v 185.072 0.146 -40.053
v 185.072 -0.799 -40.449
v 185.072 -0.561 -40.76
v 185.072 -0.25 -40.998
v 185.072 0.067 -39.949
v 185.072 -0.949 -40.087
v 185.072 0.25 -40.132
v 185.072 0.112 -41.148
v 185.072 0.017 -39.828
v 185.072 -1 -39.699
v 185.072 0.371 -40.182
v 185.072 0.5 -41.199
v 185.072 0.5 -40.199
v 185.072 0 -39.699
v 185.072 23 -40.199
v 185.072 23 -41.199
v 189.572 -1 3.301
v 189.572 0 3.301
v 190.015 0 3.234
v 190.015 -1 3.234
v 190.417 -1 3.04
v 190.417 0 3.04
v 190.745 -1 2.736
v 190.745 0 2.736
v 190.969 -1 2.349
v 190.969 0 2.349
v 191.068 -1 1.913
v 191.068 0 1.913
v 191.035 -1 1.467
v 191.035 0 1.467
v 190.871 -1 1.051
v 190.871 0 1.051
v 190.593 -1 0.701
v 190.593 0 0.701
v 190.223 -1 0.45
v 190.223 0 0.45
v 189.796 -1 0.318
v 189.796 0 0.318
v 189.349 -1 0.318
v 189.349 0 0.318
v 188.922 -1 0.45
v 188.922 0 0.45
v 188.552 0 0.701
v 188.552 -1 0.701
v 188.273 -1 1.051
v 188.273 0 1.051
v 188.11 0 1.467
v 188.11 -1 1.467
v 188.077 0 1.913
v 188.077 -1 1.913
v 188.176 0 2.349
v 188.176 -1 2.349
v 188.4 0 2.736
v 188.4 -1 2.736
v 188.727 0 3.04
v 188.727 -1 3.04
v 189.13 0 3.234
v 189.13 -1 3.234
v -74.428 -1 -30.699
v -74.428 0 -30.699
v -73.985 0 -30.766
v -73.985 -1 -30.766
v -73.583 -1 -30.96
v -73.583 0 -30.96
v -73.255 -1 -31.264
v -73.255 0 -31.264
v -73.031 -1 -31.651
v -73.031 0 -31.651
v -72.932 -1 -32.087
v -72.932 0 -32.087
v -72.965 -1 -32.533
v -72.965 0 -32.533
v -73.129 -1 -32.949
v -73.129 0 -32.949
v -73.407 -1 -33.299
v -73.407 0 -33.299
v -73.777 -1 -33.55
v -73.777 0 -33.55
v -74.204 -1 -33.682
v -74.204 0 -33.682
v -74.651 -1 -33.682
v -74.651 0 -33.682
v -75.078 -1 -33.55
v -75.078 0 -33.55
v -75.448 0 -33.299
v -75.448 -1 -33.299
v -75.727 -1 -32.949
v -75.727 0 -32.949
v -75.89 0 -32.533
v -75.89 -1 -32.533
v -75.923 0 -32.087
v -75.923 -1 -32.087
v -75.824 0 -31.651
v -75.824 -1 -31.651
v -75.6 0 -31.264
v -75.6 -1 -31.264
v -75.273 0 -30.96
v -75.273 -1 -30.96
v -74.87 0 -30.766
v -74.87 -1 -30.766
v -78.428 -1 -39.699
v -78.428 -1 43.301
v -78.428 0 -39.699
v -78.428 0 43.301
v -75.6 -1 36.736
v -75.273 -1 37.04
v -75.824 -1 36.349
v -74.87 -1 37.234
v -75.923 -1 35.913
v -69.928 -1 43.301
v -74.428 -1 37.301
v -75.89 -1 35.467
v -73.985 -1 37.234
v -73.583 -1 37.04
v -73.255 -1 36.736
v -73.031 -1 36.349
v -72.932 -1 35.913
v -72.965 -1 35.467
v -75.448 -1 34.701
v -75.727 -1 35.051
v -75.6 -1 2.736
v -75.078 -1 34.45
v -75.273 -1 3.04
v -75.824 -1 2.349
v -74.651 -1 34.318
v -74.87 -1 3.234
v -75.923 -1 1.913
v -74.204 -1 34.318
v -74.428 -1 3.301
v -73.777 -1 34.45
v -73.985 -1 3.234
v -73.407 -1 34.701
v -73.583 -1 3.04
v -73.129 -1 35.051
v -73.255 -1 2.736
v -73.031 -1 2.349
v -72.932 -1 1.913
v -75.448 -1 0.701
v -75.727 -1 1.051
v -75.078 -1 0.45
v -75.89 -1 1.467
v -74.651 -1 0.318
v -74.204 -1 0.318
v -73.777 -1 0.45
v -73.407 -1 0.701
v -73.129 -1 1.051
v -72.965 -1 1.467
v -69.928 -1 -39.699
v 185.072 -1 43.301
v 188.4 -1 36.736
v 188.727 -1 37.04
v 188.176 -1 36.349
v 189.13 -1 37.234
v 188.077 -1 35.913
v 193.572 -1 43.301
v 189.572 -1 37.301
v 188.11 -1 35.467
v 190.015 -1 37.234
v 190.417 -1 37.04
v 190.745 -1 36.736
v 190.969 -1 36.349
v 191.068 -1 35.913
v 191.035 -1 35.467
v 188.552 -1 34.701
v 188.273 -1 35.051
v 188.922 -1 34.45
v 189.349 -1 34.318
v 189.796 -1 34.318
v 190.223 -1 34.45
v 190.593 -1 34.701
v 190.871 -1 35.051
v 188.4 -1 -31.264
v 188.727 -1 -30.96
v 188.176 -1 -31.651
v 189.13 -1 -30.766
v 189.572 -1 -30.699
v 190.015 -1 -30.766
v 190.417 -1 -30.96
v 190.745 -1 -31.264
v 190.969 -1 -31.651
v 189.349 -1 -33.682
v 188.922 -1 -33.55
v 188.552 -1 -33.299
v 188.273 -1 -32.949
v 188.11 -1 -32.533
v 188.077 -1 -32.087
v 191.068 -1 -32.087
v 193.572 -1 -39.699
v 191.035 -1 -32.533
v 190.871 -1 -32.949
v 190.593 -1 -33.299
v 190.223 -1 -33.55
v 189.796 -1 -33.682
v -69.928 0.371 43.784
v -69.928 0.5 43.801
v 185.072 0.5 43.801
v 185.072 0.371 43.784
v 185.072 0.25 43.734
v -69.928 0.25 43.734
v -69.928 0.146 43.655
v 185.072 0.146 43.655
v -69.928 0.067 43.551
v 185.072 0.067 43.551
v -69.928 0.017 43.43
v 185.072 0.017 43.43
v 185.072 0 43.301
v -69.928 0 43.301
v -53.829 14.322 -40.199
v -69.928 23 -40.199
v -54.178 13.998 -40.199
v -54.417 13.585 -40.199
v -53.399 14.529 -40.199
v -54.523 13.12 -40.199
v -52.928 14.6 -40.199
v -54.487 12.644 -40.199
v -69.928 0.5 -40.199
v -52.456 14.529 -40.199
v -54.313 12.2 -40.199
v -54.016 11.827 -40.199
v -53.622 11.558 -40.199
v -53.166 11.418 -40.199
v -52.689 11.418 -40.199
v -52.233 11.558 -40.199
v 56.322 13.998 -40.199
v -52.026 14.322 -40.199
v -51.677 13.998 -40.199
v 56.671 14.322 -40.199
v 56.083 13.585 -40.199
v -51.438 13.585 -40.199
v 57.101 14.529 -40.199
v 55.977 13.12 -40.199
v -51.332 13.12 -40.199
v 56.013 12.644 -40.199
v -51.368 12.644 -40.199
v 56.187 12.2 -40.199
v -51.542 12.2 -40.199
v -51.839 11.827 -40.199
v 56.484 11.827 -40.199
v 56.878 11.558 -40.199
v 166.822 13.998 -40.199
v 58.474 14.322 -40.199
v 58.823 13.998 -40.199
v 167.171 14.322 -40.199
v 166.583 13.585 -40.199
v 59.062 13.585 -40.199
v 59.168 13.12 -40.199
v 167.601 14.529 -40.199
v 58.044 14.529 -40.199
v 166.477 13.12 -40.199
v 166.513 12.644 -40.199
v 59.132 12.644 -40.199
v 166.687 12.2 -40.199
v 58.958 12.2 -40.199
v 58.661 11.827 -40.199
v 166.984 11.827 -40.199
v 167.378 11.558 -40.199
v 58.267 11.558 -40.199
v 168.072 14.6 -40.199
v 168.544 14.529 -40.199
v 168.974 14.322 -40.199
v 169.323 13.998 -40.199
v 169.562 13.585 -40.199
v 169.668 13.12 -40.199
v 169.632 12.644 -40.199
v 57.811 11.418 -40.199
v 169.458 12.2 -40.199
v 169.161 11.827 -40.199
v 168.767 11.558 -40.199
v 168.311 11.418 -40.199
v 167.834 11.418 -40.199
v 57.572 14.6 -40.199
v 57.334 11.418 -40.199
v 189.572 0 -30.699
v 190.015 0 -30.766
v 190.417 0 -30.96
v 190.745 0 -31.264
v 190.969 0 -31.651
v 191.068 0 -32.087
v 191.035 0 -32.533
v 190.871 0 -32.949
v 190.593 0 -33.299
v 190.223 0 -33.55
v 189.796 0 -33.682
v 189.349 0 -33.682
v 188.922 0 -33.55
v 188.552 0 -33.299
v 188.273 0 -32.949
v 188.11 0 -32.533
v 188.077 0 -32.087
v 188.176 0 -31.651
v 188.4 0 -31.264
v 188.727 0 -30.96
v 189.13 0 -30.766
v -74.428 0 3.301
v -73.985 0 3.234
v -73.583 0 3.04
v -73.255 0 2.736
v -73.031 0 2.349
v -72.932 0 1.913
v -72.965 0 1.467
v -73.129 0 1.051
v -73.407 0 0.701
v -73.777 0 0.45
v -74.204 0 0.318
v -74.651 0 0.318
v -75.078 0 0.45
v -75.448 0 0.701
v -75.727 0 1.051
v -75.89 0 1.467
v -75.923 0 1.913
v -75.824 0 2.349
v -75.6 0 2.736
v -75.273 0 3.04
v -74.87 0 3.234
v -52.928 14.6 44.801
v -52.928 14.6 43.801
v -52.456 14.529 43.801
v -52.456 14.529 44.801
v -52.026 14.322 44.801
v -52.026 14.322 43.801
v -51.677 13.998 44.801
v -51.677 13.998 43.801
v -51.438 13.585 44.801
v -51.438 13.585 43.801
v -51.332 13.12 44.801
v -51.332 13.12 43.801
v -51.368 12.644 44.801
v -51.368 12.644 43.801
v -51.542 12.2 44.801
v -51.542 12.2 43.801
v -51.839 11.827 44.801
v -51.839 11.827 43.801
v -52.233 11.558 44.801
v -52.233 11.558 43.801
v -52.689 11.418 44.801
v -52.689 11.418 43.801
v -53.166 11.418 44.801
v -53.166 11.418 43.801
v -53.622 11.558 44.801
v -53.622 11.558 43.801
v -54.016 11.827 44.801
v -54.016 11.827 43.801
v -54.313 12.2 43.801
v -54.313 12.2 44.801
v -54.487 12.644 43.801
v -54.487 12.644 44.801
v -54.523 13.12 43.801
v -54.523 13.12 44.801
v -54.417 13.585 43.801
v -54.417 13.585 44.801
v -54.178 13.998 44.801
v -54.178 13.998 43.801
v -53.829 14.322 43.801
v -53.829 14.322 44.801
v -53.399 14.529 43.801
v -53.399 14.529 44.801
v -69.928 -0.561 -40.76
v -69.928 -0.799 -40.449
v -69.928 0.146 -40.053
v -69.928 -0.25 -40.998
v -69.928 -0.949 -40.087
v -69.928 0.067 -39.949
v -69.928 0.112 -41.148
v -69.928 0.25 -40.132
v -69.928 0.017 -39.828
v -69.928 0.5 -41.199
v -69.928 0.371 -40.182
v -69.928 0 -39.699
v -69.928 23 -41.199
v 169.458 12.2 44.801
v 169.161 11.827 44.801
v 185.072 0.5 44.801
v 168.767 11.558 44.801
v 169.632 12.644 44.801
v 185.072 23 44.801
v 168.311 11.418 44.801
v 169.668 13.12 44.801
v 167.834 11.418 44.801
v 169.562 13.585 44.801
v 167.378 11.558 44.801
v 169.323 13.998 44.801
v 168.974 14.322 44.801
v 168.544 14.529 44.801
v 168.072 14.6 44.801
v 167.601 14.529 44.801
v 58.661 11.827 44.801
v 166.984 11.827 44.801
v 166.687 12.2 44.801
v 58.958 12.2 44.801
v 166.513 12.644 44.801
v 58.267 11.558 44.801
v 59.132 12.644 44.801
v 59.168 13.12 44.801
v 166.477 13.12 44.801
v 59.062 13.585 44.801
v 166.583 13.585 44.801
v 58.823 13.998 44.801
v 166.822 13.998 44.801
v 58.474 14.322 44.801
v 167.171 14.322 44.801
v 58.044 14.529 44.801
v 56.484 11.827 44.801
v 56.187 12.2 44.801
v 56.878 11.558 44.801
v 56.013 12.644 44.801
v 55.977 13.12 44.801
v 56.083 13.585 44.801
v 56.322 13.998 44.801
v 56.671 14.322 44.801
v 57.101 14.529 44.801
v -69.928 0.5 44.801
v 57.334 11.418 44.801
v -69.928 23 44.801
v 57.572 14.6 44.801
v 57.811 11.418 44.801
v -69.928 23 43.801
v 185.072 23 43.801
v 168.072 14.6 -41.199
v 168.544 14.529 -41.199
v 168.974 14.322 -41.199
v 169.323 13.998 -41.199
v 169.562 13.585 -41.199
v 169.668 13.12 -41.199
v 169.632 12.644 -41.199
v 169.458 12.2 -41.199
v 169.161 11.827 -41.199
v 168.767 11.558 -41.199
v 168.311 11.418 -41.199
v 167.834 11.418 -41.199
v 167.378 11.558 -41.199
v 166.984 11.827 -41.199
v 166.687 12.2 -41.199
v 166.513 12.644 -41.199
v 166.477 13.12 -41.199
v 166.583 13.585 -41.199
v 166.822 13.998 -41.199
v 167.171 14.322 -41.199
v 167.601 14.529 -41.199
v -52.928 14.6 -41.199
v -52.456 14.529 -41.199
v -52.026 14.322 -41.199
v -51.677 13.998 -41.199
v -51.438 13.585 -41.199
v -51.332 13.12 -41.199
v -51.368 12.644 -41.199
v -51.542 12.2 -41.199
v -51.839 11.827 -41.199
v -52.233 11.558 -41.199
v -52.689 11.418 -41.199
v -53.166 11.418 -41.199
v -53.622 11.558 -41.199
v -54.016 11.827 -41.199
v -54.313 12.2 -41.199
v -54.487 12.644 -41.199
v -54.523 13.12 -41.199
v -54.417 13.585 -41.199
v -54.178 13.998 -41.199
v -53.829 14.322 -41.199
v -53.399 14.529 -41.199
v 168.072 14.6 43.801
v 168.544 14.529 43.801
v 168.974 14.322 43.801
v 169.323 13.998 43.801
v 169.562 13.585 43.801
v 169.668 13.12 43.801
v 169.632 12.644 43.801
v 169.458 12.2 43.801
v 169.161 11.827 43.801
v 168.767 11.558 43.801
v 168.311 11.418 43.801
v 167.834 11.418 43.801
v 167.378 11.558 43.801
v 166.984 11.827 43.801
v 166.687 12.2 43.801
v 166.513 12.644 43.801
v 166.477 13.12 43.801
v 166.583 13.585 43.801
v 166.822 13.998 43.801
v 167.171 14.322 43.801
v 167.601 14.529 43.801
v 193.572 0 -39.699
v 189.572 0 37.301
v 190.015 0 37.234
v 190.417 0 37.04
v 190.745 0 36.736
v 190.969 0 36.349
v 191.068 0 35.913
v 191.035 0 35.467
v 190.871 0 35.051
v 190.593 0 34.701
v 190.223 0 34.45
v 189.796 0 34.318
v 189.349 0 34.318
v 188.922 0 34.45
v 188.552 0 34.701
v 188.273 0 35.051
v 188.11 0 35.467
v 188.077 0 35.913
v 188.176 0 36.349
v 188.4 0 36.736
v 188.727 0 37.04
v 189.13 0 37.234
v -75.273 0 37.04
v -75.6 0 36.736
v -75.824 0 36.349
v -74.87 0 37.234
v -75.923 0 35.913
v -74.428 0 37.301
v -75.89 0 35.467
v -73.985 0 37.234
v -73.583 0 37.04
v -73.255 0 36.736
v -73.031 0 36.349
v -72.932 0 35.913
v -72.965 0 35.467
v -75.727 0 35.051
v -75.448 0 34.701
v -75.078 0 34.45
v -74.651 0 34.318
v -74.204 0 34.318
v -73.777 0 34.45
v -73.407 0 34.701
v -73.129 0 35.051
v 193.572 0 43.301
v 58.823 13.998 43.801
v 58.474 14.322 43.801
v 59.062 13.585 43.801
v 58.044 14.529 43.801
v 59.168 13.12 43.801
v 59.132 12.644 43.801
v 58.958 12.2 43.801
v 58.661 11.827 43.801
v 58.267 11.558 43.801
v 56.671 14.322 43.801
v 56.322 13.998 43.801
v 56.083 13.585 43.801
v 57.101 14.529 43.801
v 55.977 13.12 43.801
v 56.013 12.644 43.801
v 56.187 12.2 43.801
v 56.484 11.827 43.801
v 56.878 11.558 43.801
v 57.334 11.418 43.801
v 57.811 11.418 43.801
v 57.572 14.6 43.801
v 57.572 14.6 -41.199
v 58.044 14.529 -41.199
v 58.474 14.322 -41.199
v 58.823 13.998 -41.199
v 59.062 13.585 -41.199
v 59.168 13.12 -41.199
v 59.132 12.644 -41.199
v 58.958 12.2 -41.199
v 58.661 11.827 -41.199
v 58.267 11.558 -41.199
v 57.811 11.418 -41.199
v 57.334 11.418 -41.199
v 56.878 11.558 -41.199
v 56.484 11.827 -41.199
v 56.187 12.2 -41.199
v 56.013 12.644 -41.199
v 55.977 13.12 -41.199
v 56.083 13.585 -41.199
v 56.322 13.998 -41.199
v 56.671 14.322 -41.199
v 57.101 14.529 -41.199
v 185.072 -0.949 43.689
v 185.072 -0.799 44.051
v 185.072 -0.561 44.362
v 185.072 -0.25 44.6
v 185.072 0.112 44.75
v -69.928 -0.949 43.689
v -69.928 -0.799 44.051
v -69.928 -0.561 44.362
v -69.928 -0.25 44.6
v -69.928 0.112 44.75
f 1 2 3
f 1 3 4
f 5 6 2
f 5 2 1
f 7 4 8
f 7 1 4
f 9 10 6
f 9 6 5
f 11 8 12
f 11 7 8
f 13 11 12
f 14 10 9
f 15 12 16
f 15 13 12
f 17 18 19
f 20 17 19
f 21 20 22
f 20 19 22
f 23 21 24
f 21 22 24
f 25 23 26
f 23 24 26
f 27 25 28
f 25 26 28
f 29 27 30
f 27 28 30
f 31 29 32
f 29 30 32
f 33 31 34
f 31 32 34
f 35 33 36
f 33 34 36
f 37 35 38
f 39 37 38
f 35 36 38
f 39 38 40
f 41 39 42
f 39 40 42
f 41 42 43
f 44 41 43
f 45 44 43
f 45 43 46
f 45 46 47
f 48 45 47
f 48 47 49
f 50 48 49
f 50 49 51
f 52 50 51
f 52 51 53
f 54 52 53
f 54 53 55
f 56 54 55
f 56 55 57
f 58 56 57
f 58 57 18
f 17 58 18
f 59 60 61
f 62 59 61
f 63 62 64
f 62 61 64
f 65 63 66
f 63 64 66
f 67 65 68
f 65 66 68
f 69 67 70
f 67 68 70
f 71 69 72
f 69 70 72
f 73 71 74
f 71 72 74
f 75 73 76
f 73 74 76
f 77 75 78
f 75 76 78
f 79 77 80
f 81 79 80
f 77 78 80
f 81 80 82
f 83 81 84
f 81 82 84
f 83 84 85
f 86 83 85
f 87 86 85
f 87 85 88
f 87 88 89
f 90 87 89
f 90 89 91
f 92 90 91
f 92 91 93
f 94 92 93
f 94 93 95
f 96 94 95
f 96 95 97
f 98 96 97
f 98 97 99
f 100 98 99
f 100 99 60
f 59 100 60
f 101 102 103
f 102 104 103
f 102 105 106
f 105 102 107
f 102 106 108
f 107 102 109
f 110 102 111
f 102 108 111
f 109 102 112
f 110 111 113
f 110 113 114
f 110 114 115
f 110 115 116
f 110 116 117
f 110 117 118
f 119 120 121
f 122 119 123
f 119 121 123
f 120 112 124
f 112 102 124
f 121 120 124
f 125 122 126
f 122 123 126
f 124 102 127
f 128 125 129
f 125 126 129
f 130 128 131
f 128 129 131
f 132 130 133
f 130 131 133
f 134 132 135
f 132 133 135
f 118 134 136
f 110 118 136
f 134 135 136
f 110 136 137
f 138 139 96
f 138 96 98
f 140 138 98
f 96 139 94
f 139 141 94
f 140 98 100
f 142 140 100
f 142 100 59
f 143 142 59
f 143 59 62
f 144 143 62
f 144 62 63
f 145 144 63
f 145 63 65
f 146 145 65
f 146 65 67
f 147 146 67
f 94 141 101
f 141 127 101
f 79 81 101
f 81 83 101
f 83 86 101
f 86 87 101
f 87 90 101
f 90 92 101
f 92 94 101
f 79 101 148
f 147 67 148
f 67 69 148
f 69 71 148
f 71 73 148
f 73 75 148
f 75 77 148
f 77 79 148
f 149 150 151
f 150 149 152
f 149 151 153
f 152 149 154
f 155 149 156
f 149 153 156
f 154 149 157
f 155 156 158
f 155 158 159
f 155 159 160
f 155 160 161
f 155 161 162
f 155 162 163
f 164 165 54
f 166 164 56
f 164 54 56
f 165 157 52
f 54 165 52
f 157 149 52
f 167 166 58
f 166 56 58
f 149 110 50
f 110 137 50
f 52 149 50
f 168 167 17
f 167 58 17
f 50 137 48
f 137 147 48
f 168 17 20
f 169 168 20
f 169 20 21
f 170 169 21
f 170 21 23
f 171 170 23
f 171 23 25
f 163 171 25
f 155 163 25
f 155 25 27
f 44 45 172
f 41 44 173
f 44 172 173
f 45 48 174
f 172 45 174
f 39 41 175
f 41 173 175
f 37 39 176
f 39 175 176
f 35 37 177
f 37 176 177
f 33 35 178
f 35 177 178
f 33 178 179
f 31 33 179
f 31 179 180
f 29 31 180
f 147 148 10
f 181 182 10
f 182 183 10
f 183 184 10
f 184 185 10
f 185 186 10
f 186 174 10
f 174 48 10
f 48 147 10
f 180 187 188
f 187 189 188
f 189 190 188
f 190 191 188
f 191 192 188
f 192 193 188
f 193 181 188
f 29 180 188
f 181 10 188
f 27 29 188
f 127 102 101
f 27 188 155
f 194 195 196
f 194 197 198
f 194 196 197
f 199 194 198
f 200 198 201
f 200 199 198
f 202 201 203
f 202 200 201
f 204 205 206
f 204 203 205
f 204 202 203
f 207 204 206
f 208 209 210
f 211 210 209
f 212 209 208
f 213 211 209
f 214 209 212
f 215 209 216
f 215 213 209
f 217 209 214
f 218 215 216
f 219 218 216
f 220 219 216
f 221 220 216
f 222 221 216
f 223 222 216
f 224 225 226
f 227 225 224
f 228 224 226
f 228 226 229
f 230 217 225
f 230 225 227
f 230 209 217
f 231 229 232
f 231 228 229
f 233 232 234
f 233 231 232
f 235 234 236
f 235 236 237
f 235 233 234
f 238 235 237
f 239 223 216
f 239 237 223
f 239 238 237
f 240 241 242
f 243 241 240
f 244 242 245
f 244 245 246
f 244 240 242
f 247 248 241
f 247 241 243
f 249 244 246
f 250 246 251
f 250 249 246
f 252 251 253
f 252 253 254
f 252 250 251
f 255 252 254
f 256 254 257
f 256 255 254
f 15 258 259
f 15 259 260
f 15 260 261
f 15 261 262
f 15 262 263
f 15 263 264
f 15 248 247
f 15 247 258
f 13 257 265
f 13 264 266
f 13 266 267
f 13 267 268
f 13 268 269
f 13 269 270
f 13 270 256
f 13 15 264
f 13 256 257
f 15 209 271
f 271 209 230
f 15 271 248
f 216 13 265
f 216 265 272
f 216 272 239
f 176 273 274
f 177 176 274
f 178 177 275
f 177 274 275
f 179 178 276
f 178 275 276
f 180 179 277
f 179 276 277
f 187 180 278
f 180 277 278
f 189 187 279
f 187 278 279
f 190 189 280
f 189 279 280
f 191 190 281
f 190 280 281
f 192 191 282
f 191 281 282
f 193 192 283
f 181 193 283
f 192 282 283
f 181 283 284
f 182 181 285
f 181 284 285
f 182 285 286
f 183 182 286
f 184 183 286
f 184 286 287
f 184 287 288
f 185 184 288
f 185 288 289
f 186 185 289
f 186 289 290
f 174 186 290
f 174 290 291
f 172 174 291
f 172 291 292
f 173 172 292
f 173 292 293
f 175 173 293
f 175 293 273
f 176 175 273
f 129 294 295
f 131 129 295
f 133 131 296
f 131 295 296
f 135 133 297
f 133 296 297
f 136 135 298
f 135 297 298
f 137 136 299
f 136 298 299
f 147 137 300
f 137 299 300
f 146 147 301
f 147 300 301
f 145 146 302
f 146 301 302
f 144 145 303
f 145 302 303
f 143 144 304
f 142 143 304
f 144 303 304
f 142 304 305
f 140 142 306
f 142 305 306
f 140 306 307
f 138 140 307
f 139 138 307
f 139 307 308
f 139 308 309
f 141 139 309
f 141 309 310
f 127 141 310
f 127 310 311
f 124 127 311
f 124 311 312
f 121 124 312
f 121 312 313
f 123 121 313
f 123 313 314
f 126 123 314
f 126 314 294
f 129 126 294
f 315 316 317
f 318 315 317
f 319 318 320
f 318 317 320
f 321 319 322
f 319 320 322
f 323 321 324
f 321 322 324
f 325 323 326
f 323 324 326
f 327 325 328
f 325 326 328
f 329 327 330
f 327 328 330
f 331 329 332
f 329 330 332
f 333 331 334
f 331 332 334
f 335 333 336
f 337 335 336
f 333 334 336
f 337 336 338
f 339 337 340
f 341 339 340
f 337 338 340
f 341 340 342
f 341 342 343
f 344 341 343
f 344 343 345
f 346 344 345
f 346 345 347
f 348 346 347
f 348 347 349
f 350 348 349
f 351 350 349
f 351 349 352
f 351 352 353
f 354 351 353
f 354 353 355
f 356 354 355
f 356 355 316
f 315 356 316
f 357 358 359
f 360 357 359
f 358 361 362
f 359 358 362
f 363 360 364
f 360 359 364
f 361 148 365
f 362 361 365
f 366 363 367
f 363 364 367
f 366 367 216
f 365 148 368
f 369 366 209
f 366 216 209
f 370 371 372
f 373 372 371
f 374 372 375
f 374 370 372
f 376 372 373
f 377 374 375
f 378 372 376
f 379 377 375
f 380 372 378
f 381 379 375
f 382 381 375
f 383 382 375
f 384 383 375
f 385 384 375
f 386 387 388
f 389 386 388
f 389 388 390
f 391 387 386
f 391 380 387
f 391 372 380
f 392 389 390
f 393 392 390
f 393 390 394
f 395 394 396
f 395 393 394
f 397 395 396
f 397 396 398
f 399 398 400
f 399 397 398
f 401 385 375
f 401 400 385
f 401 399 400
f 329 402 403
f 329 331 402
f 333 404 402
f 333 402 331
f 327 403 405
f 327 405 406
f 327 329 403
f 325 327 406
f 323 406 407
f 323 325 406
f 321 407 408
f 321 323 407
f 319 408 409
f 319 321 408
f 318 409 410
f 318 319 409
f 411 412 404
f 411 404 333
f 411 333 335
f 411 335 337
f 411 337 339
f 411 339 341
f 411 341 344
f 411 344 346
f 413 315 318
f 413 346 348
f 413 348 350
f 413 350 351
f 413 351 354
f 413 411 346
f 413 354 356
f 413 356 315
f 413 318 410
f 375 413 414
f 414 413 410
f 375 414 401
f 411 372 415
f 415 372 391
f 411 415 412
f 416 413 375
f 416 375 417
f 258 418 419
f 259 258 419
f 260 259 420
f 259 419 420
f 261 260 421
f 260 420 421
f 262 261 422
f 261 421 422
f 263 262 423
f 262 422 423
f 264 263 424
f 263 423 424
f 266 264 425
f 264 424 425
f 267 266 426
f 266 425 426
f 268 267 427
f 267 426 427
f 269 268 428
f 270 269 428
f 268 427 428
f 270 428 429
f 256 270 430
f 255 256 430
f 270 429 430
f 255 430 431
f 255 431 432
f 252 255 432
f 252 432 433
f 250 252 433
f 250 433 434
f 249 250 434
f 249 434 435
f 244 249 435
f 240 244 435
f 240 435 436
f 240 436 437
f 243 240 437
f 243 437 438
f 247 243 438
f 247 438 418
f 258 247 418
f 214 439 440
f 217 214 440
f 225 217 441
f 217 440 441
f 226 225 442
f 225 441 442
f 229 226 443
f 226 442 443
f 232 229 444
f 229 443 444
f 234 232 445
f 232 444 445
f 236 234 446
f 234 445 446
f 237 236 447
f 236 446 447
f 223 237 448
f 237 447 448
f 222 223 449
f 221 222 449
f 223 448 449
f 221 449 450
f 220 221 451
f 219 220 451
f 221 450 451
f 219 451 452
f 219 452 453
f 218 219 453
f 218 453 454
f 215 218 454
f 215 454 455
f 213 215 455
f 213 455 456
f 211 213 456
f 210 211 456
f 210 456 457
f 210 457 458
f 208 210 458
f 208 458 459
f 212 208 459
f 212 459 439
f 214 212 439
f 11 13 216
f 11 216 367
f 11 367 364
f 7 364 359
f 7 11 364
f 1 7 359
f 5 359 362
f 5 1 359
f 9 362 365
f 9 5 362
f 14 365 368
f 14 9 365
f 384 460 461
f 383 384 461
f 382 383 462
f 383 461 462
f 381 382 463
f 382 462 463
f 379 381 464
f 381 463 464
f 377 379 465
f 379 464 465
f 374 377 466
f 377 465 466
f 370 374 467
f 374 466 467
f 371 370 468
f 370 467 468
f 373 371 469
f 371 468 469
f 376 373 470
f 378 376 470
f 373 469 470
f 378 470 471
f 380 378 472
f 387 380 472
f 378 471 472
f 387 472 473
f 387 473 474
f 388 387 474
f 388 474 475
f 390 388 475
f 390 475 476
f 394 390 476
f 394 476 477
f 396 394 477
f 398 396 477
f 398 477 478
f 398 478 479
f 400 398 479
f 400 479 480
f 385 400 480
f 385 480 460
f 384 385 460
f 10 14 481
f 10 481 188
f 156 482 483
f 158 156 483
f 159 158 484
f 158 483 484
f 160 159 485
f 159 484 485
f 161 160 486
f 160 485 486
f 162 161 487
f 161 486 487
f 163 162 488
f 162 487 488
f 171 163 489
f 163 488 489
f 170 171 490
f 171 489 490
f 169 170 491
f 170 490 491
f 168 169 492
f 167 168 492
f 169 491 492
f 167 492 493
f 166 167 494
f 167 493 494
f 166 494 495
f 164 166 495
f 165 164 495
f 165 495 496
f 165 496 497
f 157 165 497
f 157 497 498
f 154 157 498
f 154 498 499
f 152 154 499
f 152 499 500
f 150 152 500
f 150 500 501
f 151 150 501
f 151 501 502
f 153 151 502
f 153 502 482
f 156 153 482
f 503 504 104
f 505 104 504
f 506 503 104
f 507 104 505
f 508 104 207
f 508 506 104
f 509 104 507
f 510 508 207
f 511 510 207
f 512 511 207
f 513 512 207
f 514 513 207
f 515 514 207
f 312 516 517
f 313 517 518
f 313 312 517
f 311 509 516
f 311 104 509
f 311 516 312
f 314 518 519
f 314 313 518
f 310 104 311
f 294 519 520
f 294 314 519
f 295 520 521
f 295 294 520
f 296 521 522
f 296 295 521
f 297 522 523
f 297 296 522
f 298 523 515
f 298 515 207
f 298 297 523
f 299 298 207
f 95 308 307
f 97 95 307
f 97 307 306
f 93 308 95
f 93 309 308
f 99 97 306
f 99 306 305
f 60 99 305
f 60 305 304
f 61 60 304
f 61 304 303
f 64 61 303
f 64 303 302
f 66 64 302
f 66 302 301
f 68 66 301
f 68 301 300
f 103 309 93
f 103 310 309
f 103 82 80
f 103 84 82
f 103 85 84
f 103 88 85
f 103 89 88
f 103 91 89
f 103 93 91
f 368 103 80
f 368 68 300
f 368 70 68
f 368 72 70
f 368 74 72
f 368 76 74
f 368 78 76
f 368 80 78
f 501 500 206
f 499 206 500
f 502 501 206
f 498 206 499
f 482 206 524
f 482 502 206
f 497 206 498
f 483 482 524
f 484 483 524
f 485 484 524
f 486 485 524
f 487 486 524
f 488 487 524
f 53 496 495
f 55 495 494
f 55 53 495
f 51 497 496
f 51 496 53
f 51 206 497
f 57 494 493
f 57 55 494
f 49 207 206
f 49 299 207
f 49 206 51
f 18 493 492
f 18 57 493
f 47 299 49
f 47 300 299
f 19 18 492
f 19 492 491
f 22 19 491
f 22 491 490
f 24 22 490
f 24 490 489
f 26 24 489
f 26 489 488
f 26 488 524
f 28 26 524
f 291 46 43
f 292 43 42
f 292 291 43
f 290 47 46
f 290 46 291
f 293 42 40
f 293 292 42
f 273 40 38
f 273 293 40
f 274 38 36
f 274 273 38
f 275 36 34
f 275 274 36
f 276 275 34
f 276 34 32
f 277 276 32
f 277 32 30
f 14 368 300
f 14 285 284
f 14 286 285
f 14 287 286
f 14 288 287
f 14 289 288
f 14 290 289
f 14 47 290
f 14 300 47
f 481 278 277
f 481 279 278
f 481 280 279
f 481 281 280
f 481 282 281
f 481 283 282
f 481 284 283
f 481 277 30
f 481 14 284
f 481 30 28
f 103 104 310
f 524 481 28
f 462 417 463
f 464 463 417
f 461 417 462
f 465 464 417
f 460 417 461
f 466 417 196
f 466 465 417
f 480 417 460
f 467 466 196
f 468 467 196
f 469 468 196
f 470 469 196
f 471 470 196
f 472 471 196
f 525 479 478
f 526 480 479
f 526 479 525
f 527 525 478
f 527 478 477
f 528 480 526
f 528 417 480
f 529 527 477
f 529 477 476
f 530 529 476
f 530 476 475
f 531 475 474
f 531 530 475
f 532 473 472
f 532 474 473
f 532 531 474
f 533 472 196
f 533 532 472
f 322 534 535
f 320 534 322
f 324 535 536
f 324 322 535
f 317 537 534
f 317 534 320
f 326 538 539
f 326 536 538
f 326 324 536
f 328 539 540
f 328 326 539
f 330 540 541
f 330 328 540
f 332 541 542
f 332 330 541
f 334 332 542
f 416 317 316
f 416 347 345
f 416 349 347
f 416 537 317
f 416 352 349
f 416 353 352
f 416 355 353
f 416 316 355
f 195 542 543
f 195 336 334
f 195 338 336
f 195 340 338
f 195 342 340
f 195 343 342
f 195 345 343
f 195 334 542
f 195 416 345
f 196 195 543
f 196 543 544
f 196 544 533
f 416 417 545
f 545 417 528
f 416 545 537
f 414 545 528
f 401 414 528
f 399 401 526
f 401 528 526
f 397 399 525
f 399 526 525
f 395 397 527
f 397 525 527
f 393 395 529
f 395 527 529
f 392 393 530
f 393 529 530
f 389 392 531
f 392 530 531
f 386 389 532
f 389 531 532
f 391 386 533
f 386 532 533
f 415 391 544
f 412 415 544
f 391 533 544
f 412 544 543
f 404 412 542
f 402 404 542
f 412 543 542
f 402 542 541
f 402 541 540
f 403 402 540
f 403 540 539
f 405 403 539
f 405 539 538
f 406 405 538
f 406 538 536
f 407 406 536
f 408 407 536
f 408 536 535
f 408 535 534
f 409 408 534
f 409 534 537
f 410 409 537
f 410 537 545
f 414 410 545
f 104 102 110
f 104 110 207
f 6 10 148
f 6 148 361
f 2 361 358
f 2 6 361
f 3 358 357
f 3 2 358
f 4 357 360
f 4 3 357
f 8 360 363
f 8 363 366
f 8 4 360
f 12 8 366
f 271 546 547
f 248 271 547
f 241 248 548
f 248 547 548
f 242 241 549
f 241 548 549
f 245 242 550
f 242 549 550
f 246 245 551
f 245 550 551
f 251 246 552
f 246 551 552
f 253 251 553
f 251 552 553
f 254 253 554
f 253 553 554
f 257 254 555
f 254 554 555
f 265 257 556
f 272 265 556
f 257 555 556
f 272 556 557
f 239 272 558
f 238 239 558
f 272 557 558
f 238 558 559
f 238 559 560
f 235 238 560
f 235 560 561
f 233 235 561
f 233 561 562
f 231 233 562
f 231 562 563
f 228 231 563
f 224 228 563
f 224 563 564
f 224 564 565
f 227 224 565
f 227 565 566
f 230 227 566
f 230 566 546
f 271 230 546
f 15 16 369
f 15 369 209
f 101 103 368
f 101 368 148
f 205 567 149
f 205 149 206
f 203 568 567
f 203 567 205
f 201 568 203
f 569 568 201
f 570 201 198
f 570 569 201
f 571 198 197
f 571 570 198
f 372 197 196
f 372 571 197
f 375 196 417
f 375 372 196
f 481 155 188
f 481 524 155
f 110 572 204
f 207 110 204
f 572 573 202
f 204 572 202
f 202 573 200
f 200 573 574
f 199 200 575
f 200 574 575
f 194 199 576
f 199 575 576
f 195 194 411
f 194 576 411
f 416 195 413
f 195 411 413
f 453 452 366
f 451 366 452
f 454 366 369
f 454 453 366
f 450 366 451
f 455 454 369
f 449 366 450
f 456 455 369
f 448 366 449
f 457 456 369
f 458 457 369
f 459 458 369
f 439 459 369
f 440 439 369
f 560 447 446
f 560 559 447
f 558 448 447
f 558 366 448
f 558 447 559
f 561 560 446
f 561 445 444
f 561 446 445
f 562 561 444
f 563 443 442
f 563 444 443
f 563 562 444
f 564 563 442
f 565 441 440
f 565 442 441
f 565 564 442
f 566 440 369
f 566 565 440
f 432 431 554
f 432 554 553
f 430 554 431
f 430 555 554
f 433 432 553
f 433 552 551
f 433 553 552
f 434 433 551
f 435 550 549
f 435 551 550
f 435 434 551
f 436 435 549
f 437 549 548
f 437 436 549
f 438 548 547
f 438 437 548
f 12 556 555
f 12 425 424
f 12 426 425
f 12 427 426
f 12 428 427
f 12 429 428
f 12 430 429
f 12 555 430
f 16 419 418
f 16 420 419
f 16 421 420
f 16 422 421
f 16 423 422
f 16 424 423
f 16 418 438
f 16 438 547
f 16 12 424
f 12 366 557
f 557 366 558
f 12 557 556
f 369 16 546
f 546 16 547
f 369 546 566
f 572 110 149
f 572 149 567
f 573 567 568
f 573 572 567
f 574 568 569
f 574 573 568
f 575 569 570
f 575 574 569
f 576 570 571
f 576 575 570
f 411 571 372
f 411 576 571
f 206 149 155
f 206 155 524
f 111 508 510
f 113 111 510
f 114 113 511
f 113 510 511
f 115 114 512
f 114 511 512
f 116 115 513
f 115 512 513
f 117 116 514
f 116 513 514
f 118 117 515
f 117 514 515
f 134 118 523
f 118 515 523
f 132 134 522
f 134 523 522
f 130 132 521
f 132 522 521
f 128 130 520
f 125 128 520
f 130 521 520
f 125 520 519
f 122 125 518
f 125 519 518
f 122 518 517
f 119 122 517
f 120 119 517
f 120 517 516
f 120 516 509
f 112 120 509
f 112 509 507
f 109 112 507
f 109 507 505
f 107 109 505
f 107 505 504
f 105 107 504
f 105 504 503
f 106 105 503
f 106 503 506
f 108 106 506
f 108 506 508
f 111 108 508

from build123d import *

# Parameters (mm, degrees)
SKETCH1_W                      = 272
SKETCH1_H                      = 84
BASE_FLANGE1_DEPTH             = 1
EDGE_FLANGE1_STRIP_W           = 5
EDGE_FLANGE1_STRIP_H           = 1
EDGE_FLANGE1_STRIP_CUT_DEPTH   = 272
EDGE_FLANGE1_STRIP_2_W         = 5
EDGE_FLANGE1_STRIP_2_H         = 1
EDGE_FLANGE1_STRIP_CUT_2_DEPTH = 272
EDGE_FLANGE1_DEPTH             = 272
EDGE_FLANGE1_BEND_DEPTH        = 272
CUT_EXTRUDE1_START             = -78.427547771
CUT_EXTRUDE1_DEPTH             = 8.5
CUT_EXTRUDE1_START_2           = 185.072452229
CUT_EXTRUDE1_2_DEPTH           = 8.5
SKETCH13_R                     = 1.6
CUT_EXTRUDE2_DEPTH             = 100
SKETCH14_R                     = 1.5
CUT_EXTRUDE3_DEPTH             = 100


# Read off the part's stored shape, not the designer's step: Cut-Extrude1
# Sheet-metal steps are written as plain solids
with BuildPart() as part:
    # Sketch1 → Base-Flange1 (new body)
    with BuildSketch(Plane(origin=(0, 0, 0), x_dir=(1, 0, 0), z_dir=(0, 1, 0))):
        with Locations((57.572452229, -1.800955414)):
            Rectangle(SKETCH1_W, SKETCH1_H)
    extrude(amount=-BASE_FLANGE1_DEPTH)

    # Edge-Flange1 strip (across the edge) → Edge-Flange1 strip cut (cut)
    with BuildSketch(Plane(origin=(-78.427547771, 0, 43.800955414), x_dir=(0, 0, -1), z_dir=(1, 0, 0))):
        with Locations((-2, -0.5)):
            Rectangle(EDGE_FLANGE1_STRIP_W, EDGE_FLANGE1_STRIP_H)
    extrude(amount=EDGE_FLANGE1_STRIP_CUT_DEPTH, mode=Mode.SUBTRACT)

    # Edge-Flange1 strip 2 (across the edge) → Edge-Flange1 strip cut 2 (cut)
    with BuildSketch(Plane(origin=(193.572452229, 0, -40.199044586), x_dir=(0, 0, 1), z_dir=(-1, 0, 0))):
        with Locations((-2, -0.5)):
            Rectangle(EDGE_FLANGE1_STRIP_2_W, EDGE_FLANGE1_STRIP_2_H)
    extrude(amount=EDGE_FLANGE1_STRIP_CUT_2_DEPTH, mode=Mode.SUBTRACT)

    # Edge-Flange1 section (across the edge) → Edge-Flange1 (add)
    with BuildSketch(Plane(origin=(-78.427547771, 0, 43.800955414), x_dir=(0, 0, -1), z_dir=(1, 0, 0))):
        with BuildLine():
            Line((-1, 0.5), (-1, 23))
            Line((-1, 23), (0, 23))
            Line((0, 23), (0, 0.5))
            ThreePointArc((0, 0.5), (0.146446609, 0.146446609), (0.5, 0))
            Line((0.5, 0), (0.5, -1))
            ThreePointArc((0.5, -1), (-0.560660172, -0.560660172), (-1, 0.5))
        make_face()
    extrude(amount=EDGE_FLANGE1_DEPTH)

    # Edge-Flange1 section 2 (across the edge) → Edge-Flange1 bend (add)
    with BuildSketch(Plane(origin=(193.572452229, 0, -40.199044586), x_dir=(0, 0, 1), z_dir=(-1, 0, 0))):
        with BuildLine():
            Line((-1, 0.5), (-1, 23))
            Line((-1, 23), (0, 23))
            Line((0, 23), (0, 0.5))
            ThreePointArc((0, 0.5), (0.146446609, 0.146446609), (0.5, 0))
            Line((0.5, 0), (0.5, -1))
            ThreePointArc((0.5, -1), (-0.560660172, -0.560660172), (-1, 0.5))
        make_face()
    extrude(amount=EDGE_FLANGE1_BEND_DEPTH)

    # Cut-Extrude1 outline → Cut-Extrude1 (cut)
    with BuildSketch(Plane.YZ.offset(CUT_EXTRUDE1_START)):
        with BuildLine():
            ThreePointArc((0.5, -40.199044586), (0.146446609, -40.052597977), (0, -39.699044586))
            Line((0, -39.699044586), (-1, -39.699044586))
            ThreePointArc((-1, -39.699044586), (-0.560660172, -40.759704758), (0.5, -41.199044586))
            Line((0.5, -41.199044586), (23, -41.199044586))
            Line((23, -41.199044586), (23, -40.199044586))
            Line((23, -40.199044586), (0.5, -40.199044586))
        make_face()
        with BuildLine():
            ThreePointArc((0.5, 44.800955414), (-0.560660172, 44.361615586), (-1, 43.300955414))
            Line((-1, 43.300955414), (0, 43.300955414))
            ThreePointArc((0, 43.300955414), (0.146446609, 43.654508805), (0.5, 43.800955414))
            Line((0.5, 43.800955414), (23, 43.800955414))
            Line((23, 43.800955414), (23, 44.800955414))
            Line((23, 44.800955414), (0.5, 44.800955414))
        make_face()
    extrude(amount=CUT_EXTRUDE1_DEPTH, mode=Mode.SUBTRACT)

    # Cut-Extrude1 2 outline → Cut-Extrude1 2 (cut)
    with BuildSketch(Plane.YZ.offset(CUT_EXTRUDE1_START_2)):
        with BuildLine():
            ThreePointArc((0.5, -40.199044586), (0.146446609, -40.052597977), (0, -39.699044586))
            Line((0, -39.699044586), (-1, -39.699044586))
            ThreePointArc((-1, -39.699044586), (-0.560660172, -40.759704758), (0.5, -41.199044586))
            Line((0.5, -41.199044586), (23, -41.199044586))
            Line((23, -41.199044586), (23, -40.199044586))
            Line((23, -40.199044586), (0.5, -40.199044586))
        make_face()
        with BuildLine():
            ThreePointArc((0.5, 44.800955414), (-0.560660172, 44.361615586), (-1, 43.300955414))
            Line((-1, 43.300955414), (0, 43.300955414))
            ThreePointArc((0, 43.300955414), (0.146446609, 43.654508805), (0.5, 43.800955414))
            Line((0.5, 43.800955414), (23, 43.800955414))
            Line((23, 43.800955414), (23, 44.800955414))
            Line((23, 44.800955414), (0.5, 44.800955414))
        make_face()
    extrude(amount=CUT_EXTRUDE1_2_DEPTH, mode=Mode.SUBTRACT)

    # Sketch13 → Cut-Extrude2 (cut)
    with BuildSketch(Plane(origin=(0, 0, -41.199044586), x_dir=(-1, 0, 0), z_dir=(0, 0, -1))):
        with Locations(Location((-168.072452229, 13, 0), (0, 0, 90))):
            Circle(SKETCH13_R)
        with Locations(Location((-57.572452229, 13, 0), (0, 0, 90))):
            Circle(SKETCH13_R)
        with Locations(Location((52.927547771, 13, 0), (0, 0, 90))):
            Circle(SKETCH13_R)
    extrude(amount=-CUT_EXTRUDE2_DEPTH, mode=Mode.SUBTRACT)

    # Sketch14 → Cut-Extrude3 (cut)
    with BuildSketch(Plane(origin=(0, 0, 0), x_dir=(1, 0, 0), z_dir=(0, 1, 0))):
        with Locations(Location((-74.427547771, -1.800955414, 0), (0, 0, 270))):
            Circle(SKETCH14_R)
        with Locations(Location((-74.427547771, 32.199044586, 0), (0, 0, 270))):
            Circle(SKETCH14_R)
        with Locations(Location((-74.427547771, -35.800955414, 0), (0, 0, 270))):
            Circle(SKETCH14_R)
        with Locations(Location((189.572452229, -35.800955414, 0), (0, 0, 270))):
            Circle(SKETCH14_R)
        with Locations(Location((189.572452229, -1.800955414, 0), (0, 0, 270))):
            Circle(SKETCH14_R)
        with Locations(Location((189.572452229, 32.199044586, 0), (0, 0, 270))):
            Circle(SKETCH14_R)
    extrude(amount=-CUT_EXTRUDE3_DEPTH, mode=Mode.SUBTRACT)


solid = part.part
